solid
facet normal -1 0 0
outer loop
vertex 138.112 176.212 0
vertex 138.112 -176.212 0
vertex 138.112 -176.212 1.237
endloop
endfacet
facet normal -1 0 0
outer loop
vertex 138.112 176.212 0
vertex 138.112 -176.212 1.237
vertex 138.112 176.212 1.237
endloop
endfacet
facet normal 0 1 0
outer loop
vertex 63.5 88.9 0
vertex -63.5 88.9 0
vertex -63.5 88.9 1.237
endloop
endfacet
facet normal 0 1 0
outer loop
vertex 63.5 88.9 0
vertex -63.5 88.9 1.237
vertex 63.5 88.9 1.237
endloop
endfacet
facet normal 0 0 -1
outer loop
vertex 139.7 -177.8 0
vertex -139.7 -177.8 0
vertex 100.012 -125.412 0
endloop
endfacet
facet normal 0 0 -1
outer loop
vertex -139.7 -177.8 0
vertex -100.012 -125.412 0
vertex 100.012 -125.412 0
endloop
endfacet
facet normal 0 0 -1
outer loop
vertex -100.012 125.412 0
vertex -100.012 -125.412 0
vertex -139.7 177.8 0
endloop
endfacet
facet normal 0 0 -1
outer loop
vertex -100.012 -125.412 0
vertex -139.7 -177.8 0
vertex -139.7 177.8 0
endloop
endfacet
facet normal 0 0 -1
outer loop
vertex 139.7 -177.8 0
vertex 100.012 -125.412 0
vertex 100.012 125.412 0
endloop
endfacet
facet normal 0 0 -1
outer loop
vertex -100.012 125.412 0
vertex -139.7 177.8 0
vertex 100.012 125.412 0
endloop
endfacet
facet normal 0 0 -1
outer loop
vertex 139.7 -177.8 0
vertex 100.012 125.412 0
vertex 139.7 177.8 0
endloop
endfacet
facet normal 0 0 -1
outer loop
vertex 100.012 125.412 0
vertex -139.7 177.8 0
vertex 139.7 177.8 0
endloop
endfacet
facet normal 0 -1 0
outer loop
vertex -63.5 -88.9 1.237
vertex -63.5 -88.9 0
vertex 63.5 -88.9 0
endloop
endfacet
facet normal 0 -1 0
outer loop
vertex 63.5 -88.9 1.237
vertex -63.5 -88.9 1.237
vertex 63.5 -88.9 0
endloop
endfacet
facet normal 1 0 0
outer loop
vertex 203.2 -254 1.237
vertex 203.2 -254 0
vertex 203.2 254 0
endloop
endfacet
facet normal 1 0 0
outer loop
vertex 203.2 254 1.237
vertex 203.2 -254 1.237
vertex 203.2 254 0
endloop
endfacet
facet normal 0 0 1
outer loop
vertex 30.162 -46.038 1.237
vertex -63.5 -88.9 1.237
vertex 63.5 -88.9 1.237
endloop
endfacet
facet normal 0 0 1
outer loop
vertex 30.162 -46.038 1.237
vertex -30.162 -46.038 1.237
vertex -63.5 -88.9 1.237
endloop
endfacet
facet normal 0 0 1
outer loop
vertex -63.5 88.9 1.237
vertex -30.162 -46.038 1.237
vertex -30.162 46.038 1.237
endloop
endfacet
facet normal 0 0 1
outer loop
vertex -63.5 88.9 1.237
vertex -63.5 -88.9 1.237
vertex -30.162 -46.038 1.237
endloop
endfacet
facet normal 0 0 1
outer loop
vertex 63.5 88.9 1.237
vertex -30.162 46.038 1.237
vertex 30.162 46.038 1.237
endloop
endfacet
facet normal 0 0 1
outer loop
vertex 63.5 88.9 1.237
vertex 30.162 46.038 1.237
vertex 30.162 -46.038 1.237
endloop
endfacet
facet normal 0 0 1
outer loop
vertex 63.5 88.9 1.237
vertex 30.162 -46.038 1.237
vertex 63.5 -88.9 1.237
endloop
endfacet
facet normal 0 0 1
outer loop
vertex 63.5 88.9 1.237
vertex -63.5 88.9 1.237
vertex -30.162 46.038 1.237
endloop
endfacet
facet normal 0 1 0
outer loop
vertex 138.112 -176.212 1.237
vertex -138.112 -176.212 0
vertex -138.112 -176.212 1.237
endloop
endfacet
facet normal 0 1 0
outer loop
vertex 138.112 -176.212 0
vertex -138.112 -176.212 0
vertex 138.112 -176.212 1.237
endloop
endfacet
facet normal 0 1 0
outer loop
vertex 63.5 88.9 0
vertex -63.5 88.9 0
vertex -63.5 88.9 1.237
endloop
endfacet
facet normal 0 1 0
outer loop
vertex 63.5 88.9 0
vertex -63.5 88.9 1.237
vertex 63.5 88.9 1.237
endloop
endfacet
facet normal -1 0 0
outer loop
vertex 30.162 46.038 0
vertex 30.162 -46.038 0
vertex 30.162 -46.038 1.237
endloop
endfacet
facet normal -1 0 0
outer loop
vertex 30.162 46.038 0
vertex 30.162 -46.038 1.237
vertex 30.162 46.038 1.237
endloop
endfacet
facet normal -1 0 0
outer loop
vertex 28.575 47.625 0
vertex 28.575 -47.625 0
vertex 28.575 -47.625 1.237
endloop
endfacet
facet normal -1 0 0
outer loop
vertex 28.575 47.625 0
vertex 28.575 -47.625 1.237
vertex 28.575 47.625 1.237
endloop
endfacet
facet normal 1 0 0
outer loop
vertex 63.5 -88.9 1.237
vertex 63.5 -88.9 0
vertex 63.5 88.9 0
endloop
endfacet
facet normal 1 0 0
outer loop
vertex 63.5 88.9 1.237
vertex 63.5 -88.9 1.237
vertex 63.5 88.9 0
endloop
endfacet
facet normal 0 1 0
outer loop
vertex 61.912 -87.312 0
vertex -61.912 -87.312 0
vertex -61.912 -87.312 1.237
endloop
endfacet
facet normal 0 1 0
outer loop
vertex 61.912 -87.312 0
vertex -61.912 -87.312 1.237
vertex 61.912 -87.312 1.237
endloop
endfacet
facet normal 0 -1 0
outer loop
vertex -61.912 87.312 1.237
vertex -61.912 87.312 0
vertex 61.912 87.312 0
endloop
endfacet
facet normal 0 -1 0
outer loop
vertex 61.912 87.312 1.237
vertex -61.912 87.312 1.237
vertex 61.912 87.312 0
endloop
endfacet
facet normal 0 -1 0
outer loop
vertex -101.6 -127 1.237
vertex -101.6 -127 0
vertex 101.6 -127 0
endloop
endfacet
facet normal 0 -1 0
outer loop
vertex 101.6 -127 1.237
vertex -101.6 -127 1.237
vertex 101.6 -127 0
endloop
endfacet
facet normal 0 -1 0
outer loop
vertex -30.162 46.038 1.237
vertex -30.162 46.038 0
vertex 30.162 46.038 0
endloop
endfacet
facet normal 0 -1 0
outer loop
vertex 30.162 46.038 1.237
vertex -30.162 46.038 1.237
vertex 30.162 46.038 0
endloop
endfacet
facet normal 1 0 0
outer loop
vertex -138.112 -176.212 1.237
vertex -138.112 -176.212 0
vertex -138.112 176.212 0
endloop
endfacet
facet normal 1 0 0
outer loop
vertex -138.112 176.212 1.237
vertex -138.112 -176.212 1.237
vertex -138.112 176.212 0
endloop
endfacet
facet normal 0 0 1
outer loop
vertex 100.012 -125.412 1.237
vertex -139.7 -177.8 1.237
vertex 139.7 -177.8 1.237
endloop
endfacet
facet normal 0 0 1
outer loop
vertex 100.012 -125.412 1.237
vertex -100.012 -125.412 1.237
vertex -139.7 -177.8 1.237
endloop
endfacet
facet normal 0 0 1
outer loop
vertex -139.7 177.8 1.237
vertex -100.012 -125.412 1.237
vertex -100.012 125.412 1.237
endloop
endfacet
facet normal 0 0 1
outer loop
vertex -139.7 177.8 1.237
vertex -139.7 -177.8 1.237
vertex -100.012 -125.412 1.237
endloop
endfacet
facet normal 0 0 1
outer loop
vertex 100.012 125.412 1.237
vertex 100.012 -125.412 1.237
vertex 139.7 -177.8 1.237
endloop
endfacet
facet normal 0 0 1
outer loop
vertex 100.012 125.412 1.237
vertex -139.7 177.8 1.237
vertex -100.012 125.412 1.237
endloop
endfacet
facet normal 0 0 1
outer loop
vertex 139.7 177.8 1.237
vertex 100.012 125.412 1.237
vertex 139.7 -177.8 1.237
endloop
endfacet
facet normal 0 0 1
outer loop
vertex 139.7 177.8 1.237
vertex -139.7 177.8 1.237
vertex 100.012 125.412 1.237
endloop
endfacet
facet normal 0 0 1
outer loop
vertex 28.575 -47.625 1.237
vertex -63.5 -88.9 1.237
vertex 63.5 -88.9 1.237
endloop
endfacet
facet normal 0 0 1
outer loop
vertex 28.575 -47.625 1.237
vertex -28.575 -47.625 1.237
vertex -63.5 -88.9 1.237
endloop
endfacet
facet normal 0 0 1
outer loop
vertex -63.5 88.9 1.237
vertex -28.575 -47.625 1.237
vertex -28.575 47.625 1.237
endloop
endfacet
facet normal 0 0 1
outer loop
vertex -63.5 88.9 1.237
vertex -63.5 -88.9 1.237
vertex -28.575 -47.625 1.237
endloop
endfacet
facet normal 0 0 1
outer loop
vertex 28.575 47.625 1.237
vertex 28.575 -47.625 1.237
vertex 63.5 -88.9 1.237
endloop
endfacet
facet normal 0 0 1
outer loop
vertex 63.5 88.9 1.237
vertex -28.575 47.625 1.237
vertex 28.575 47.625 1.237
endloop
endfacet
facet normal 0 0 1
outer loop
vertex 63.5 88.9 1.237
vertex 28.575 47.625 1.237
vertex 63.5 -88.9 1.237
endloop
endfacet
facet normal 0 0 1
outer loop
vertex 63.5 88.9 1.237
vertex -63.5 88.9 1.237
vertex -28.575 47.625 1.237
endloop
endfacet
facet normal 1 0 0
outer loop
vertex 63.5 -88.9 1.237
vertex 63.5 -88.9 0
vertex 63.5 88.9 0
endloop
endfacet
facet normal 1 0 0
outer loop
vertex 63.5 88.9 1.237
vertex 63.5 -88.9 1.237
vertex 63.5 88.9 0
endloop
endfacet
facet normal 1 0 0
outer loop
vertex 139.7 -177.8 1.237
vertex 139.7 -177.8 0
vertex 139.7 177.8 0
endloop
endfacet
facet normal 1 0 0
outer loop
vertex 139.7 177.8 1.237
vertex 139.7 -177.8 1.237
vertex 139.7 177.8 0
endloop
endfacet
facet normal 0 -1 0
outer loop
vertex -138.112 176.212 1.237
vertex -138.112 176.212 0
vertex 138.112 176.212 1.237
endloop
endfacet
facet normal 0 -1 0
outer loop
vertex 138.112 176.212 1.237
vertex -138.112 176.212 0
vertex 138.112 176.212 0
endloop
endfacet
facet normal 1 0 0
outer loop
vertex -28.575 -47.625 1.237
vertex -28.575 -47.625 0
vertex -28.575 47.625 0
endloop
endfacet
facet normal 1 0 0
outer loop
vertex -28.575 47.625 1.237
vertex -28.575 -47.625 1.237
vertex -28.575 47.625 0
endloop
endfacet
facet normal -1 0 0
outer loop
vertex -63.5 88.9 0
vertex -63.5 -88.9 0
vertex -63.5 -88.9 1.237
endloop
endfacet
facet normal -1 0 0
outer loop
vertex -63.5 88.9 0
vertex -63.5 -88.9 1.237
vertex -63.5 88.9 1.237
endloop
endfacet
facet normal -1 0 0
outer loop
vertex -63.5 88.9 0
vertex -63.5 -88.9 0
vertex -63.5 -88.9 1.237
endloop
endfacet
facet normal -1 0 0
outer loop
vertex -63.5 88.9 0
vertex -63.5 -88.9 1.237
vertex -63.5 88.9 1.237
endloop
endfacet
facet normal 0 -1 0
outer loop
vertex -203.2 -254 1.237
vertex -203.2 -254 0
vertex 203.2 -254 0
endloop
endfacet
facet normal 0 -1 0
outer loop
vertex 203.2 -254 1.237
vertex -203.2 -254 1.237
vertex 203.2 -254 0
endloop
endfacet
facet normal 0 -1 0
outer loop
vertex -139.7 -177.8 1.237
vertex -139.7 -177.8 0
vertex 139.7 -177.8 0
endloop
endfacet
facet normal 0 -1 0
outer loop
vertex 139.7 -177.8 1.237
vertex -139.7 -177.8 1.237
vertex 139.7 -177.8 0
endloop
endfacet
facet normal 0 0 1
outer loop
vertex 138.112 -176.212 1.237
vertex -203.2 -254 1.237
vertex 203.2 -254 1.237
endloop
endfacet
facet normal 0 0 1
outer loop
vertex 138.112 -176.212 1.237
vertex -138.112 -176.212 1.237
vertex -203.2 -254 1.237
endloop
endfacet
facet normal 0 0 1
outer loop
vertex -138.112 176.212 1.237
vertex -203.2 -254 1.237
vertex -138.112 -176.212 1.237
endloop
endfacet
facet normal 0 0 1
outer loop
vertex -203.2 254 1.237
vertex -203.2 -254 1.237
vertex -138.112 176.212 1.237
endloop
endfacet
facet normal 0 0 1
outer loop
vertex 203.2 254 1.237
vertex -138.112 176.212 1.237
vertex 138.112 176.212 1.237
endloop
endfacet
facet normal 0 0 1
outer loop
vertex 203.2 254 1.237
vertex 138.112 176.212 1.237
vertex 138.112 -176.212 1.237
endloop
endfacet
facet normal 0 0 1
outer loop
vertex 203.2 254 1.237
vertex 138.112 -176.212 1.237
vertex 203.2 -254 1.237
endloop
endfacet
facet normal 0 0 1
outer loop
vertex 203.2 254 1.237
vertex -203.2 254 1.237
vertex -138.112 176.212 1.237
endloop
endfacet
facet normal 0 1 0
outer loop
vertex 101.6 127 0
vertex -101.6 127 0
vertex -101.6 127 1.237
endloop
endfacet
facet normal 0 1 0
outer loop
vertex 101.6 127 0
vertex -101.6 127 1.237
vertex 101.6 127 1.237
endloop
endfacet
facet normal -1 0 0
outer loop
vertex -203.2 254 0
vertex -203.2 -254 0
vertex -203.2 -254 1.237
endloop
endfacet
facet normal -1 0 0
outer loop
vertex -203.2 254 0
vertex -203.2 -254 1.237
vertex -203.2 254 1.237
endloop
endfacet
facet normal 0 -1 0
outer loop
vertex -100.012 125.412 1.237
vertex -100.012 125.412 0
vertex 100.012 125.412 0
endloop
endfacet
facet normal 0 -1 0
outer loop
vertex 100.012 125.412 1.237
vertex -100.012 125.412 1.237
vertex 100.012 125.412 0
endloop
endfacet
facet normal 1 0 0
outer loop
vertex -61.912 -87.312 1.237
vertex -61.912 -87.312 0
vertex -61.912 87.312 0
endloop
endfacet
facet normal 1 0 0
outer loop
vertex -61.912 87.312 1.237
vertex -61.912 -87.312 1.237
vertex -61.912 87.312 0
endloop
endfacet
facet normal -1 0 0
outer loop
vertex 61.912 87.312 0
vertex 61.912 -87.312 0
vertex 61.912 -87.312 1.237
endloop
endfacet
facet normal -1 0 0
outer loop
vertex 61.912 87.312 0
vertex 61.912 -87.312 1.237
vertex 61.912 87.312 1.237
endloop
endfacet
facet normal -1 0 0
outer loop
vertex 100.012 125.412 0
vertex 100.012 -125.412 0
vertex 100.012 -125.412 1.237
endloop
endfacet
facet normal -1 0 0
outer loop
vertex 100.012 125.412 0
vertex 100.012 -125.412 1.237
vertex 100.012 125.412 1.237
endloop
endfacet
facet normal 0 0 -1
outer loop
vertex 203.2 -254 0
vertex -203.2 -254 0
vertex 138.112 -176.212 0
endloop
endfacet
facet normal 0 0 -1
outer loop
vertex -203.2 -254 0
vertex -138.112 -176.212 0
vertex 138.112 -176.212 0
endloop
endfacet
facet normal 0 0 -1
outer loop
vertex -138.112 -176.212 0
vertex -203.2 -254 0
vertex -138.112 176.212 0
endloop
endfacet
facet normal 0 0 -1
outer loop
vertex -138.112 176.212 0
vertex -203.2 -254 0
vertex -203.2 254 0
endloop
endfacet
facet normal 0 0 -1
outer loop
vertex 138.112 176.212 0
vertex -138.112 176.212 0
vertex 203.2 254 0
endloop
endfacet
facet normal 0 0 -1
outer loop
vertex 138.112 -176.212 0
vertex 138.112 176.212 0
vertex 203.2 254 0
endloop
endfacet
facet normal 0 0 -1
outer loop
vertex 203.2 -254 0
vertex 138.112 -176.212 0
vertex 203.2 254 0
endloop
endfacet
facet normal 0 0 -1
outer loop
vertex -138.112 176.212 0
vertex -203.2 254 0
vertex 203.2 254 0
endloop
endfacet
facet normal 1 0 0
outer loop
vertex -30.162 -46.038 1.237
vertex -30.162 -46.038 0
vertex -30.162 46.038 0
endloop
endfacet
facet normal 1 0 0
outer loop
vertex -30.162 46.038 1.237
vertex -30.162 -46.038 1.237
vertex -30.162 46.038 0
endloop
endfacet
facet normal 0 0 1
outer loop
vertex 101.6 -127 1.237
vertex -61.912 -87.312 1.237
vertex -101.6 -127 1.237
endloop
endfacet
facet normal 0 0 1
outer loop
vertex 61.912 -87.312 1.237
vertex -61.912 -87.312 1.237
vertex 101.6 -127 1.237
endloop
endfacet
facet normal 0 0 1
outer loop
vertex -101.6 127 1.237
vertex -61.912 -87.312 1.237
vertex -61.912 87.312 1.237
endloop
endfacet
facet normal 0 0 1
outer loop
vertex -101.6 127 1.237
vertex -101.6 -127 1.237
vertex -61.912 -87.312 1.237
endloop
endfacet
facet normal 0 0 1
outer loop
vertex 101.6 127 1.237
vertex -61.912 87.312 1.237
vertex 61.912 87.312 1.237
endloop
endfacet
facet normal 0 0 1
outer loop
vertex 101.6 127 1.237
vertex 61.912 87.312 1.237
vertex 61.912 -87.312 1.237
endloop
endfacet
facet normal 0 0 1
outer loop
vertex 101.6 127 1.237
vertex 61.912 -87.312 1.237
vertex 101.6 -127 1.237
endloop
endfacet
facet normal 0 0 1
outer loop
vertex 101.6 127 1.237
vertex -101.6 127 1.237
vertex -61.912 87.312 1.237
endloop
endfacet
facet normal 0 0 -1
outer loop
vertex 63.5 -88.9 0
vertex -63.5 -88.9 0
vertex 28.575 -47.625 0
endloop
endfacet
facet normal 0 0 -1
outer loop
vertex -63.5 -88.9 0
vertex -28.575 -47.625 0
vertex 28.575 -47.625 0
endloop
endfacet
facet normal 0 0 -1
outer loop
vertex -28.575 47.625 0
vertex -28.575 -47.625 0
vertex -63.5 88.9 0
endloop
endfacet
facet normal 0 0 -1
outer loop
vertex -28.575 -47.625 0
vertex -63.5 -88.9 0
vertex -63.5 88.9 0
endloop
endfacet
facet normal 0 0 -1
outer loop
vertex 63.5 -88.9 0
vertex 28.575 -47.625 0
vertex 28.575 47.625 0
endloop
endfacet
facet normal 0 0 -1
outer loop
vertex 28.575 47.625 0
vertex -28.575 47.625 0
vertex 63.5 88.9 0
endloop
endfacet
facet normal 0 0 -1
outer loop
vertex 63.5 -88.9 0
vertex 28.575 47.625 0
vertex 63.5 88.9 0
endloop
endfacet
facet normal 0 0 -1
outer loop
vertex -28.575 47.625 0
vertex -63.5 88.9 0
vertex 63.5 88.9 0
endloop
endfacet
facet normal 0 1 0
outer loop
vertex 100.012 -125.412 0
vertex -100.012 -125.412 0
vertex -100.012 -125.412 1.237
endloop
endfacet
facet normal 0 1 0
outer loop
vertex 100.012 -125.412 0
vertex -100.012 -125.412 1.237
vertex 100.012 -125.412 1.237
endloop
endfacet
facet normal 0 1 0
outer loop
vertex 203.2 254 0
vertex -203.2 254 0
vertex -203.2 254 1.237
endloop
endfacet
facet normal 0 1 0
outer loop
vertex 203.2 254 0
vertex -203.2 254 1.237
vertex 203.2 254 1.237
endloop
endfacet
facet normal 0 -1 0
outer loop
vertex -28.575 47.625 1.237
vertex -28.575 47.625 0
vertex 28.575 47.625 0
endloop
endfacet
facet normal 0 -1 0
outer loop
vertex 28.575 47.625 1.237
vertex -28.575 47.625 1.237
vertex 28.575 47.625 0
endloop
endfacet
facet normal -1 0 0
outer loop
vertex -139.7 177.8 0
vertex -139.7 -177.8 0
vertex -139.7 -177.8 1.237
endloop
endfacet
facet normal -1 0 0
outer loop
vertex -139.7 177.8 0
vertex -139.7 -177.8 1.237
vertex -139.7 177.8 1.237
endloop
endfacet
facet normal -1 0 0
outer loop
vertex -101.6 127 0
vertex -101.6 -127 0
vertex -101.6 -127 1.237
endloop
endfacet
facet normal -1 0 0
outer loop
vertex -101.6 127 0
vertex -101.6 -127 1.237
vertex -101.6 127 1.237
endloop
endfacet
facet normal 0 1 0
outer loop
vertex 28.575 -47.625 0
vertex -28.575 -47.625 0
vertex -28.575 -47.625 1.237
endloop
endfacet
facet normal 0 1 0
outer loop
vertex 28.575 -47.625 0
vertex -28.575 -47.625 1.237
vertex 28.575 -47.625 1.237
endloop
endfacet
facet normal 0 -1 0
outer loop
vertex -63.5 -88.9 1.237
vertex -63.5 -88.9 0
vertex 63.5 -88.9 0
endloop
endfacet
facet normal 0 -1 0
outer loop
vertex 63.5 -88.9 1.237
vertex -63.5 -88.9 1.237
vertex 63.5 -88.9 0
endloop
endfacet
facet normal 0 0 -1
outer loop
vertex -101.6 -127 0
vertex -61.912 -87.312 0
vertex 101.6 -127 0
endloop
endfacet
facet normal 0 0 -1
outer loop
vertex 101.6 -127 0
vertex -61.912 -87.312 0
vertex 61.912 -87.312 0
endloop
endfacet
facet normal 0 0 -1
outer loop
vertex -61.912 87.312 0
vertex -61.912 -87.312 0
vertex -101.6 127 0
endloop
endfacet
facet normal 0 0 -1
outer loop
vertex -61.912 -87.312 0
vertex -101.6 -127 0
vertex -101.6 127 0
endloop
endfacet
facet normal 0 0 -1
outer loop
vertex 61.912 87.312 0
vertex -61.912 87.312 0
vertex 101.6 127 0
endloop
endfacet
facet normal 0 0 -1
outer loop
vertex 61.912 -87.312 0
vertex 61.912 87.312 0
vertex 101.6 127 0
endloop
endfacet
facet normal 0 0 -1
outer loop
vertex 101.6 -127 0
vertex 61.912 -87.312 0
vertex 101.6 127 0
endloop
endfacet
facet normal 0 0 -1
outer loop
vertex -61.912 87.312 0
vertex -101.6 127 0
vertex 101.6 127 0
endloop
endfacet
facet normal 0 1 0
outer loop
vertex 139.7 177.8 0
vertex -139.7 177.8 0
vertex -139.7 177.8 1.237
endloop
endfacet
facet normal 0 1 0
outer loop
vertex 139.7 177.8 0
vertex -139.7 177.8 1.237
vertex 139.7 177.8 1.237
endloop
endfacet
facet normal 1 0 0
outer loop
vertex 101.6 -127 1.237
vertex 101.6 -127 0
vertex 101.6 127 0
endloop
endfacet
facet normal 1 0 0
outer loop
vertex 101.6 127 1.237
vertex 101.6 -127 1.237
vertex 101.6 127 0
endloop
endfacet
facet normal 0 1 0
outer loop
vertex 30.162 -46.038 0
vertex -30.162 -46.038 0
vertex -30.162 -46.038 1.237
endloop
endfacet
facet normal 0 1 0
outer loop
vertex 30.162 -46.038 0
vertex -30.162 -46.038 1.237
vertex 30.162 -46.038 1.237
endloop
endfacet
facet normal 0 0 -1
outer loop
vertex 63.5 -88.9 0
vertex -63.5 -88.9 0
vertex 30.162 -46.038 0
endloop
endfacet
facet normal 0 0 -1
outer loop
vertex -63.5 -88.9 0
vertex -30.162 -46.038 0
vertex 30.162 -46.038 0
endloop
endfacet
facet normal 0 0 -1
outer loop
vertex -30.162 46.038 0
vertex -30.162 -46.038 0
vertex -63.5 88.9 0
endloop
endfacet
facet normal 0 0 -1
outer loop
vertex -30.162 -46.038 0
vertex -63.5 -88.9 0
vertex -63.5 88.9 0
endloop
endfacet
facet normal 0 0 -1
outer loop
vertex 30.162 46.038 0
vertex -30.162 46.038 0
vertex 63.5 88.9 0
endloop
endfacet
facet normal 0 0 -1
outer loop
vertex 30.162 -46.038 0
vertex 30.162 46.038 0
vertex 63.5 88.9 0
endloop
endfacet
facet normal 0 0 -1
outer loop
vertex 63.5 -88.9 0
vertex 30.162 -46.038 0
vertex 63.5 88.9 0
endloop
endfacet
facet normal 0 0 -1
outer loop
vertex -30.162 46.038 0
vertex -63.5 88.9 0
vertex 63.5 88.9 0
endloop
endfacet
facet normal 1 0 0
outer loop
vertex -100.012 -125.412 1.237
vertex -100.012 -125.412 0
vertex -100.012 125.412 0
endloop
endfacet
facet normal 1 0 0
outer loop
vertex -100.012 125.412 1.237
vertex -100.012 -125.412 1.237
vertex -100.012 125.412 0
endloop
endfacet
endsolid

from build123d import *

# Parameters (mm, degrees)
F0_W     = 406.4
F0_H     = 508
F0_W_2   = 276.225
F0_H_2   = 352.425
F5_DEPTH = 1.23698
F1_W     = 279.4
F1_H     = 355.6
F1_W_2   = 200.025
F1_H_2   = 250.825
F2_W     = 203.2
F2_H     = 254
F2_W_2   = 123.825
F2_H_2   = 174.625
F4_W     = 127
F4_H     = 177.8
F4_W_2   = 60.325
F4_H_2   = 92.075
F3_W     = 127
F3_H     = 177.8
F3_W_2   = 57.15
F3_H_2   = 95.25


with BuildPart() as f5:
    # F0 (on Top) → F5 (new body)
    with BuildSketch(Plane.XY):
        Rectangle(F0_W, F0_H)
        Rectangle(F0_W_2, F0_H_2, mode=Mode.SUBTRACT)
    extrude(amount=F5_DEPTH)


with BuildPart() as f5b:
    # F1 (on Top) → F5, piece 2 (new body)
    with BuildSketch(Plane.XY):
        Rectangle(F1_W, F1_H)
        Rectangle(F1_W_2, F1_H_2, mode=Mode.SUBTRACT)
    extrude(amount=F5_DEPTH)


with BuildPart() as f5c:
    # F2 (on Top) → F5, piece 3 (new body)
    with BuildSketch(Plane.XY):
        Rectangle(F2_W, F2_H)
        Rectangle(F2_W_2, F2_H_2, mode=Mode.SUBTRACT)
    extrude(amount=F5_DEPTH)


with BuildPart() as f5d:
    # F4 (on Top) → F5, piece 4 (new body)
    with BuildSketch(Plane.XY):
        Rectangle(F4_W, F4_H)
        Rectangle(F4_W_2, F4_H_2, mode=Mode.SUBTRACT)
    extrude(amount=F5_DEPTH)


with BuildPart() as f5e:
    # F3 (on Top) → F5, piece 5 (new body)
    with BuildSketch(Plane.XY):
        Rectangle(F3_W, F3_H)
        Rectangle(F3_W_2, F3_H_2, mode=Mode.SUBTRACT)
    extrude(amount=F5_DEPTH)


solid = Compound([f5.part, f5b.part, f5c.part, f5d.part, f5e.part])
